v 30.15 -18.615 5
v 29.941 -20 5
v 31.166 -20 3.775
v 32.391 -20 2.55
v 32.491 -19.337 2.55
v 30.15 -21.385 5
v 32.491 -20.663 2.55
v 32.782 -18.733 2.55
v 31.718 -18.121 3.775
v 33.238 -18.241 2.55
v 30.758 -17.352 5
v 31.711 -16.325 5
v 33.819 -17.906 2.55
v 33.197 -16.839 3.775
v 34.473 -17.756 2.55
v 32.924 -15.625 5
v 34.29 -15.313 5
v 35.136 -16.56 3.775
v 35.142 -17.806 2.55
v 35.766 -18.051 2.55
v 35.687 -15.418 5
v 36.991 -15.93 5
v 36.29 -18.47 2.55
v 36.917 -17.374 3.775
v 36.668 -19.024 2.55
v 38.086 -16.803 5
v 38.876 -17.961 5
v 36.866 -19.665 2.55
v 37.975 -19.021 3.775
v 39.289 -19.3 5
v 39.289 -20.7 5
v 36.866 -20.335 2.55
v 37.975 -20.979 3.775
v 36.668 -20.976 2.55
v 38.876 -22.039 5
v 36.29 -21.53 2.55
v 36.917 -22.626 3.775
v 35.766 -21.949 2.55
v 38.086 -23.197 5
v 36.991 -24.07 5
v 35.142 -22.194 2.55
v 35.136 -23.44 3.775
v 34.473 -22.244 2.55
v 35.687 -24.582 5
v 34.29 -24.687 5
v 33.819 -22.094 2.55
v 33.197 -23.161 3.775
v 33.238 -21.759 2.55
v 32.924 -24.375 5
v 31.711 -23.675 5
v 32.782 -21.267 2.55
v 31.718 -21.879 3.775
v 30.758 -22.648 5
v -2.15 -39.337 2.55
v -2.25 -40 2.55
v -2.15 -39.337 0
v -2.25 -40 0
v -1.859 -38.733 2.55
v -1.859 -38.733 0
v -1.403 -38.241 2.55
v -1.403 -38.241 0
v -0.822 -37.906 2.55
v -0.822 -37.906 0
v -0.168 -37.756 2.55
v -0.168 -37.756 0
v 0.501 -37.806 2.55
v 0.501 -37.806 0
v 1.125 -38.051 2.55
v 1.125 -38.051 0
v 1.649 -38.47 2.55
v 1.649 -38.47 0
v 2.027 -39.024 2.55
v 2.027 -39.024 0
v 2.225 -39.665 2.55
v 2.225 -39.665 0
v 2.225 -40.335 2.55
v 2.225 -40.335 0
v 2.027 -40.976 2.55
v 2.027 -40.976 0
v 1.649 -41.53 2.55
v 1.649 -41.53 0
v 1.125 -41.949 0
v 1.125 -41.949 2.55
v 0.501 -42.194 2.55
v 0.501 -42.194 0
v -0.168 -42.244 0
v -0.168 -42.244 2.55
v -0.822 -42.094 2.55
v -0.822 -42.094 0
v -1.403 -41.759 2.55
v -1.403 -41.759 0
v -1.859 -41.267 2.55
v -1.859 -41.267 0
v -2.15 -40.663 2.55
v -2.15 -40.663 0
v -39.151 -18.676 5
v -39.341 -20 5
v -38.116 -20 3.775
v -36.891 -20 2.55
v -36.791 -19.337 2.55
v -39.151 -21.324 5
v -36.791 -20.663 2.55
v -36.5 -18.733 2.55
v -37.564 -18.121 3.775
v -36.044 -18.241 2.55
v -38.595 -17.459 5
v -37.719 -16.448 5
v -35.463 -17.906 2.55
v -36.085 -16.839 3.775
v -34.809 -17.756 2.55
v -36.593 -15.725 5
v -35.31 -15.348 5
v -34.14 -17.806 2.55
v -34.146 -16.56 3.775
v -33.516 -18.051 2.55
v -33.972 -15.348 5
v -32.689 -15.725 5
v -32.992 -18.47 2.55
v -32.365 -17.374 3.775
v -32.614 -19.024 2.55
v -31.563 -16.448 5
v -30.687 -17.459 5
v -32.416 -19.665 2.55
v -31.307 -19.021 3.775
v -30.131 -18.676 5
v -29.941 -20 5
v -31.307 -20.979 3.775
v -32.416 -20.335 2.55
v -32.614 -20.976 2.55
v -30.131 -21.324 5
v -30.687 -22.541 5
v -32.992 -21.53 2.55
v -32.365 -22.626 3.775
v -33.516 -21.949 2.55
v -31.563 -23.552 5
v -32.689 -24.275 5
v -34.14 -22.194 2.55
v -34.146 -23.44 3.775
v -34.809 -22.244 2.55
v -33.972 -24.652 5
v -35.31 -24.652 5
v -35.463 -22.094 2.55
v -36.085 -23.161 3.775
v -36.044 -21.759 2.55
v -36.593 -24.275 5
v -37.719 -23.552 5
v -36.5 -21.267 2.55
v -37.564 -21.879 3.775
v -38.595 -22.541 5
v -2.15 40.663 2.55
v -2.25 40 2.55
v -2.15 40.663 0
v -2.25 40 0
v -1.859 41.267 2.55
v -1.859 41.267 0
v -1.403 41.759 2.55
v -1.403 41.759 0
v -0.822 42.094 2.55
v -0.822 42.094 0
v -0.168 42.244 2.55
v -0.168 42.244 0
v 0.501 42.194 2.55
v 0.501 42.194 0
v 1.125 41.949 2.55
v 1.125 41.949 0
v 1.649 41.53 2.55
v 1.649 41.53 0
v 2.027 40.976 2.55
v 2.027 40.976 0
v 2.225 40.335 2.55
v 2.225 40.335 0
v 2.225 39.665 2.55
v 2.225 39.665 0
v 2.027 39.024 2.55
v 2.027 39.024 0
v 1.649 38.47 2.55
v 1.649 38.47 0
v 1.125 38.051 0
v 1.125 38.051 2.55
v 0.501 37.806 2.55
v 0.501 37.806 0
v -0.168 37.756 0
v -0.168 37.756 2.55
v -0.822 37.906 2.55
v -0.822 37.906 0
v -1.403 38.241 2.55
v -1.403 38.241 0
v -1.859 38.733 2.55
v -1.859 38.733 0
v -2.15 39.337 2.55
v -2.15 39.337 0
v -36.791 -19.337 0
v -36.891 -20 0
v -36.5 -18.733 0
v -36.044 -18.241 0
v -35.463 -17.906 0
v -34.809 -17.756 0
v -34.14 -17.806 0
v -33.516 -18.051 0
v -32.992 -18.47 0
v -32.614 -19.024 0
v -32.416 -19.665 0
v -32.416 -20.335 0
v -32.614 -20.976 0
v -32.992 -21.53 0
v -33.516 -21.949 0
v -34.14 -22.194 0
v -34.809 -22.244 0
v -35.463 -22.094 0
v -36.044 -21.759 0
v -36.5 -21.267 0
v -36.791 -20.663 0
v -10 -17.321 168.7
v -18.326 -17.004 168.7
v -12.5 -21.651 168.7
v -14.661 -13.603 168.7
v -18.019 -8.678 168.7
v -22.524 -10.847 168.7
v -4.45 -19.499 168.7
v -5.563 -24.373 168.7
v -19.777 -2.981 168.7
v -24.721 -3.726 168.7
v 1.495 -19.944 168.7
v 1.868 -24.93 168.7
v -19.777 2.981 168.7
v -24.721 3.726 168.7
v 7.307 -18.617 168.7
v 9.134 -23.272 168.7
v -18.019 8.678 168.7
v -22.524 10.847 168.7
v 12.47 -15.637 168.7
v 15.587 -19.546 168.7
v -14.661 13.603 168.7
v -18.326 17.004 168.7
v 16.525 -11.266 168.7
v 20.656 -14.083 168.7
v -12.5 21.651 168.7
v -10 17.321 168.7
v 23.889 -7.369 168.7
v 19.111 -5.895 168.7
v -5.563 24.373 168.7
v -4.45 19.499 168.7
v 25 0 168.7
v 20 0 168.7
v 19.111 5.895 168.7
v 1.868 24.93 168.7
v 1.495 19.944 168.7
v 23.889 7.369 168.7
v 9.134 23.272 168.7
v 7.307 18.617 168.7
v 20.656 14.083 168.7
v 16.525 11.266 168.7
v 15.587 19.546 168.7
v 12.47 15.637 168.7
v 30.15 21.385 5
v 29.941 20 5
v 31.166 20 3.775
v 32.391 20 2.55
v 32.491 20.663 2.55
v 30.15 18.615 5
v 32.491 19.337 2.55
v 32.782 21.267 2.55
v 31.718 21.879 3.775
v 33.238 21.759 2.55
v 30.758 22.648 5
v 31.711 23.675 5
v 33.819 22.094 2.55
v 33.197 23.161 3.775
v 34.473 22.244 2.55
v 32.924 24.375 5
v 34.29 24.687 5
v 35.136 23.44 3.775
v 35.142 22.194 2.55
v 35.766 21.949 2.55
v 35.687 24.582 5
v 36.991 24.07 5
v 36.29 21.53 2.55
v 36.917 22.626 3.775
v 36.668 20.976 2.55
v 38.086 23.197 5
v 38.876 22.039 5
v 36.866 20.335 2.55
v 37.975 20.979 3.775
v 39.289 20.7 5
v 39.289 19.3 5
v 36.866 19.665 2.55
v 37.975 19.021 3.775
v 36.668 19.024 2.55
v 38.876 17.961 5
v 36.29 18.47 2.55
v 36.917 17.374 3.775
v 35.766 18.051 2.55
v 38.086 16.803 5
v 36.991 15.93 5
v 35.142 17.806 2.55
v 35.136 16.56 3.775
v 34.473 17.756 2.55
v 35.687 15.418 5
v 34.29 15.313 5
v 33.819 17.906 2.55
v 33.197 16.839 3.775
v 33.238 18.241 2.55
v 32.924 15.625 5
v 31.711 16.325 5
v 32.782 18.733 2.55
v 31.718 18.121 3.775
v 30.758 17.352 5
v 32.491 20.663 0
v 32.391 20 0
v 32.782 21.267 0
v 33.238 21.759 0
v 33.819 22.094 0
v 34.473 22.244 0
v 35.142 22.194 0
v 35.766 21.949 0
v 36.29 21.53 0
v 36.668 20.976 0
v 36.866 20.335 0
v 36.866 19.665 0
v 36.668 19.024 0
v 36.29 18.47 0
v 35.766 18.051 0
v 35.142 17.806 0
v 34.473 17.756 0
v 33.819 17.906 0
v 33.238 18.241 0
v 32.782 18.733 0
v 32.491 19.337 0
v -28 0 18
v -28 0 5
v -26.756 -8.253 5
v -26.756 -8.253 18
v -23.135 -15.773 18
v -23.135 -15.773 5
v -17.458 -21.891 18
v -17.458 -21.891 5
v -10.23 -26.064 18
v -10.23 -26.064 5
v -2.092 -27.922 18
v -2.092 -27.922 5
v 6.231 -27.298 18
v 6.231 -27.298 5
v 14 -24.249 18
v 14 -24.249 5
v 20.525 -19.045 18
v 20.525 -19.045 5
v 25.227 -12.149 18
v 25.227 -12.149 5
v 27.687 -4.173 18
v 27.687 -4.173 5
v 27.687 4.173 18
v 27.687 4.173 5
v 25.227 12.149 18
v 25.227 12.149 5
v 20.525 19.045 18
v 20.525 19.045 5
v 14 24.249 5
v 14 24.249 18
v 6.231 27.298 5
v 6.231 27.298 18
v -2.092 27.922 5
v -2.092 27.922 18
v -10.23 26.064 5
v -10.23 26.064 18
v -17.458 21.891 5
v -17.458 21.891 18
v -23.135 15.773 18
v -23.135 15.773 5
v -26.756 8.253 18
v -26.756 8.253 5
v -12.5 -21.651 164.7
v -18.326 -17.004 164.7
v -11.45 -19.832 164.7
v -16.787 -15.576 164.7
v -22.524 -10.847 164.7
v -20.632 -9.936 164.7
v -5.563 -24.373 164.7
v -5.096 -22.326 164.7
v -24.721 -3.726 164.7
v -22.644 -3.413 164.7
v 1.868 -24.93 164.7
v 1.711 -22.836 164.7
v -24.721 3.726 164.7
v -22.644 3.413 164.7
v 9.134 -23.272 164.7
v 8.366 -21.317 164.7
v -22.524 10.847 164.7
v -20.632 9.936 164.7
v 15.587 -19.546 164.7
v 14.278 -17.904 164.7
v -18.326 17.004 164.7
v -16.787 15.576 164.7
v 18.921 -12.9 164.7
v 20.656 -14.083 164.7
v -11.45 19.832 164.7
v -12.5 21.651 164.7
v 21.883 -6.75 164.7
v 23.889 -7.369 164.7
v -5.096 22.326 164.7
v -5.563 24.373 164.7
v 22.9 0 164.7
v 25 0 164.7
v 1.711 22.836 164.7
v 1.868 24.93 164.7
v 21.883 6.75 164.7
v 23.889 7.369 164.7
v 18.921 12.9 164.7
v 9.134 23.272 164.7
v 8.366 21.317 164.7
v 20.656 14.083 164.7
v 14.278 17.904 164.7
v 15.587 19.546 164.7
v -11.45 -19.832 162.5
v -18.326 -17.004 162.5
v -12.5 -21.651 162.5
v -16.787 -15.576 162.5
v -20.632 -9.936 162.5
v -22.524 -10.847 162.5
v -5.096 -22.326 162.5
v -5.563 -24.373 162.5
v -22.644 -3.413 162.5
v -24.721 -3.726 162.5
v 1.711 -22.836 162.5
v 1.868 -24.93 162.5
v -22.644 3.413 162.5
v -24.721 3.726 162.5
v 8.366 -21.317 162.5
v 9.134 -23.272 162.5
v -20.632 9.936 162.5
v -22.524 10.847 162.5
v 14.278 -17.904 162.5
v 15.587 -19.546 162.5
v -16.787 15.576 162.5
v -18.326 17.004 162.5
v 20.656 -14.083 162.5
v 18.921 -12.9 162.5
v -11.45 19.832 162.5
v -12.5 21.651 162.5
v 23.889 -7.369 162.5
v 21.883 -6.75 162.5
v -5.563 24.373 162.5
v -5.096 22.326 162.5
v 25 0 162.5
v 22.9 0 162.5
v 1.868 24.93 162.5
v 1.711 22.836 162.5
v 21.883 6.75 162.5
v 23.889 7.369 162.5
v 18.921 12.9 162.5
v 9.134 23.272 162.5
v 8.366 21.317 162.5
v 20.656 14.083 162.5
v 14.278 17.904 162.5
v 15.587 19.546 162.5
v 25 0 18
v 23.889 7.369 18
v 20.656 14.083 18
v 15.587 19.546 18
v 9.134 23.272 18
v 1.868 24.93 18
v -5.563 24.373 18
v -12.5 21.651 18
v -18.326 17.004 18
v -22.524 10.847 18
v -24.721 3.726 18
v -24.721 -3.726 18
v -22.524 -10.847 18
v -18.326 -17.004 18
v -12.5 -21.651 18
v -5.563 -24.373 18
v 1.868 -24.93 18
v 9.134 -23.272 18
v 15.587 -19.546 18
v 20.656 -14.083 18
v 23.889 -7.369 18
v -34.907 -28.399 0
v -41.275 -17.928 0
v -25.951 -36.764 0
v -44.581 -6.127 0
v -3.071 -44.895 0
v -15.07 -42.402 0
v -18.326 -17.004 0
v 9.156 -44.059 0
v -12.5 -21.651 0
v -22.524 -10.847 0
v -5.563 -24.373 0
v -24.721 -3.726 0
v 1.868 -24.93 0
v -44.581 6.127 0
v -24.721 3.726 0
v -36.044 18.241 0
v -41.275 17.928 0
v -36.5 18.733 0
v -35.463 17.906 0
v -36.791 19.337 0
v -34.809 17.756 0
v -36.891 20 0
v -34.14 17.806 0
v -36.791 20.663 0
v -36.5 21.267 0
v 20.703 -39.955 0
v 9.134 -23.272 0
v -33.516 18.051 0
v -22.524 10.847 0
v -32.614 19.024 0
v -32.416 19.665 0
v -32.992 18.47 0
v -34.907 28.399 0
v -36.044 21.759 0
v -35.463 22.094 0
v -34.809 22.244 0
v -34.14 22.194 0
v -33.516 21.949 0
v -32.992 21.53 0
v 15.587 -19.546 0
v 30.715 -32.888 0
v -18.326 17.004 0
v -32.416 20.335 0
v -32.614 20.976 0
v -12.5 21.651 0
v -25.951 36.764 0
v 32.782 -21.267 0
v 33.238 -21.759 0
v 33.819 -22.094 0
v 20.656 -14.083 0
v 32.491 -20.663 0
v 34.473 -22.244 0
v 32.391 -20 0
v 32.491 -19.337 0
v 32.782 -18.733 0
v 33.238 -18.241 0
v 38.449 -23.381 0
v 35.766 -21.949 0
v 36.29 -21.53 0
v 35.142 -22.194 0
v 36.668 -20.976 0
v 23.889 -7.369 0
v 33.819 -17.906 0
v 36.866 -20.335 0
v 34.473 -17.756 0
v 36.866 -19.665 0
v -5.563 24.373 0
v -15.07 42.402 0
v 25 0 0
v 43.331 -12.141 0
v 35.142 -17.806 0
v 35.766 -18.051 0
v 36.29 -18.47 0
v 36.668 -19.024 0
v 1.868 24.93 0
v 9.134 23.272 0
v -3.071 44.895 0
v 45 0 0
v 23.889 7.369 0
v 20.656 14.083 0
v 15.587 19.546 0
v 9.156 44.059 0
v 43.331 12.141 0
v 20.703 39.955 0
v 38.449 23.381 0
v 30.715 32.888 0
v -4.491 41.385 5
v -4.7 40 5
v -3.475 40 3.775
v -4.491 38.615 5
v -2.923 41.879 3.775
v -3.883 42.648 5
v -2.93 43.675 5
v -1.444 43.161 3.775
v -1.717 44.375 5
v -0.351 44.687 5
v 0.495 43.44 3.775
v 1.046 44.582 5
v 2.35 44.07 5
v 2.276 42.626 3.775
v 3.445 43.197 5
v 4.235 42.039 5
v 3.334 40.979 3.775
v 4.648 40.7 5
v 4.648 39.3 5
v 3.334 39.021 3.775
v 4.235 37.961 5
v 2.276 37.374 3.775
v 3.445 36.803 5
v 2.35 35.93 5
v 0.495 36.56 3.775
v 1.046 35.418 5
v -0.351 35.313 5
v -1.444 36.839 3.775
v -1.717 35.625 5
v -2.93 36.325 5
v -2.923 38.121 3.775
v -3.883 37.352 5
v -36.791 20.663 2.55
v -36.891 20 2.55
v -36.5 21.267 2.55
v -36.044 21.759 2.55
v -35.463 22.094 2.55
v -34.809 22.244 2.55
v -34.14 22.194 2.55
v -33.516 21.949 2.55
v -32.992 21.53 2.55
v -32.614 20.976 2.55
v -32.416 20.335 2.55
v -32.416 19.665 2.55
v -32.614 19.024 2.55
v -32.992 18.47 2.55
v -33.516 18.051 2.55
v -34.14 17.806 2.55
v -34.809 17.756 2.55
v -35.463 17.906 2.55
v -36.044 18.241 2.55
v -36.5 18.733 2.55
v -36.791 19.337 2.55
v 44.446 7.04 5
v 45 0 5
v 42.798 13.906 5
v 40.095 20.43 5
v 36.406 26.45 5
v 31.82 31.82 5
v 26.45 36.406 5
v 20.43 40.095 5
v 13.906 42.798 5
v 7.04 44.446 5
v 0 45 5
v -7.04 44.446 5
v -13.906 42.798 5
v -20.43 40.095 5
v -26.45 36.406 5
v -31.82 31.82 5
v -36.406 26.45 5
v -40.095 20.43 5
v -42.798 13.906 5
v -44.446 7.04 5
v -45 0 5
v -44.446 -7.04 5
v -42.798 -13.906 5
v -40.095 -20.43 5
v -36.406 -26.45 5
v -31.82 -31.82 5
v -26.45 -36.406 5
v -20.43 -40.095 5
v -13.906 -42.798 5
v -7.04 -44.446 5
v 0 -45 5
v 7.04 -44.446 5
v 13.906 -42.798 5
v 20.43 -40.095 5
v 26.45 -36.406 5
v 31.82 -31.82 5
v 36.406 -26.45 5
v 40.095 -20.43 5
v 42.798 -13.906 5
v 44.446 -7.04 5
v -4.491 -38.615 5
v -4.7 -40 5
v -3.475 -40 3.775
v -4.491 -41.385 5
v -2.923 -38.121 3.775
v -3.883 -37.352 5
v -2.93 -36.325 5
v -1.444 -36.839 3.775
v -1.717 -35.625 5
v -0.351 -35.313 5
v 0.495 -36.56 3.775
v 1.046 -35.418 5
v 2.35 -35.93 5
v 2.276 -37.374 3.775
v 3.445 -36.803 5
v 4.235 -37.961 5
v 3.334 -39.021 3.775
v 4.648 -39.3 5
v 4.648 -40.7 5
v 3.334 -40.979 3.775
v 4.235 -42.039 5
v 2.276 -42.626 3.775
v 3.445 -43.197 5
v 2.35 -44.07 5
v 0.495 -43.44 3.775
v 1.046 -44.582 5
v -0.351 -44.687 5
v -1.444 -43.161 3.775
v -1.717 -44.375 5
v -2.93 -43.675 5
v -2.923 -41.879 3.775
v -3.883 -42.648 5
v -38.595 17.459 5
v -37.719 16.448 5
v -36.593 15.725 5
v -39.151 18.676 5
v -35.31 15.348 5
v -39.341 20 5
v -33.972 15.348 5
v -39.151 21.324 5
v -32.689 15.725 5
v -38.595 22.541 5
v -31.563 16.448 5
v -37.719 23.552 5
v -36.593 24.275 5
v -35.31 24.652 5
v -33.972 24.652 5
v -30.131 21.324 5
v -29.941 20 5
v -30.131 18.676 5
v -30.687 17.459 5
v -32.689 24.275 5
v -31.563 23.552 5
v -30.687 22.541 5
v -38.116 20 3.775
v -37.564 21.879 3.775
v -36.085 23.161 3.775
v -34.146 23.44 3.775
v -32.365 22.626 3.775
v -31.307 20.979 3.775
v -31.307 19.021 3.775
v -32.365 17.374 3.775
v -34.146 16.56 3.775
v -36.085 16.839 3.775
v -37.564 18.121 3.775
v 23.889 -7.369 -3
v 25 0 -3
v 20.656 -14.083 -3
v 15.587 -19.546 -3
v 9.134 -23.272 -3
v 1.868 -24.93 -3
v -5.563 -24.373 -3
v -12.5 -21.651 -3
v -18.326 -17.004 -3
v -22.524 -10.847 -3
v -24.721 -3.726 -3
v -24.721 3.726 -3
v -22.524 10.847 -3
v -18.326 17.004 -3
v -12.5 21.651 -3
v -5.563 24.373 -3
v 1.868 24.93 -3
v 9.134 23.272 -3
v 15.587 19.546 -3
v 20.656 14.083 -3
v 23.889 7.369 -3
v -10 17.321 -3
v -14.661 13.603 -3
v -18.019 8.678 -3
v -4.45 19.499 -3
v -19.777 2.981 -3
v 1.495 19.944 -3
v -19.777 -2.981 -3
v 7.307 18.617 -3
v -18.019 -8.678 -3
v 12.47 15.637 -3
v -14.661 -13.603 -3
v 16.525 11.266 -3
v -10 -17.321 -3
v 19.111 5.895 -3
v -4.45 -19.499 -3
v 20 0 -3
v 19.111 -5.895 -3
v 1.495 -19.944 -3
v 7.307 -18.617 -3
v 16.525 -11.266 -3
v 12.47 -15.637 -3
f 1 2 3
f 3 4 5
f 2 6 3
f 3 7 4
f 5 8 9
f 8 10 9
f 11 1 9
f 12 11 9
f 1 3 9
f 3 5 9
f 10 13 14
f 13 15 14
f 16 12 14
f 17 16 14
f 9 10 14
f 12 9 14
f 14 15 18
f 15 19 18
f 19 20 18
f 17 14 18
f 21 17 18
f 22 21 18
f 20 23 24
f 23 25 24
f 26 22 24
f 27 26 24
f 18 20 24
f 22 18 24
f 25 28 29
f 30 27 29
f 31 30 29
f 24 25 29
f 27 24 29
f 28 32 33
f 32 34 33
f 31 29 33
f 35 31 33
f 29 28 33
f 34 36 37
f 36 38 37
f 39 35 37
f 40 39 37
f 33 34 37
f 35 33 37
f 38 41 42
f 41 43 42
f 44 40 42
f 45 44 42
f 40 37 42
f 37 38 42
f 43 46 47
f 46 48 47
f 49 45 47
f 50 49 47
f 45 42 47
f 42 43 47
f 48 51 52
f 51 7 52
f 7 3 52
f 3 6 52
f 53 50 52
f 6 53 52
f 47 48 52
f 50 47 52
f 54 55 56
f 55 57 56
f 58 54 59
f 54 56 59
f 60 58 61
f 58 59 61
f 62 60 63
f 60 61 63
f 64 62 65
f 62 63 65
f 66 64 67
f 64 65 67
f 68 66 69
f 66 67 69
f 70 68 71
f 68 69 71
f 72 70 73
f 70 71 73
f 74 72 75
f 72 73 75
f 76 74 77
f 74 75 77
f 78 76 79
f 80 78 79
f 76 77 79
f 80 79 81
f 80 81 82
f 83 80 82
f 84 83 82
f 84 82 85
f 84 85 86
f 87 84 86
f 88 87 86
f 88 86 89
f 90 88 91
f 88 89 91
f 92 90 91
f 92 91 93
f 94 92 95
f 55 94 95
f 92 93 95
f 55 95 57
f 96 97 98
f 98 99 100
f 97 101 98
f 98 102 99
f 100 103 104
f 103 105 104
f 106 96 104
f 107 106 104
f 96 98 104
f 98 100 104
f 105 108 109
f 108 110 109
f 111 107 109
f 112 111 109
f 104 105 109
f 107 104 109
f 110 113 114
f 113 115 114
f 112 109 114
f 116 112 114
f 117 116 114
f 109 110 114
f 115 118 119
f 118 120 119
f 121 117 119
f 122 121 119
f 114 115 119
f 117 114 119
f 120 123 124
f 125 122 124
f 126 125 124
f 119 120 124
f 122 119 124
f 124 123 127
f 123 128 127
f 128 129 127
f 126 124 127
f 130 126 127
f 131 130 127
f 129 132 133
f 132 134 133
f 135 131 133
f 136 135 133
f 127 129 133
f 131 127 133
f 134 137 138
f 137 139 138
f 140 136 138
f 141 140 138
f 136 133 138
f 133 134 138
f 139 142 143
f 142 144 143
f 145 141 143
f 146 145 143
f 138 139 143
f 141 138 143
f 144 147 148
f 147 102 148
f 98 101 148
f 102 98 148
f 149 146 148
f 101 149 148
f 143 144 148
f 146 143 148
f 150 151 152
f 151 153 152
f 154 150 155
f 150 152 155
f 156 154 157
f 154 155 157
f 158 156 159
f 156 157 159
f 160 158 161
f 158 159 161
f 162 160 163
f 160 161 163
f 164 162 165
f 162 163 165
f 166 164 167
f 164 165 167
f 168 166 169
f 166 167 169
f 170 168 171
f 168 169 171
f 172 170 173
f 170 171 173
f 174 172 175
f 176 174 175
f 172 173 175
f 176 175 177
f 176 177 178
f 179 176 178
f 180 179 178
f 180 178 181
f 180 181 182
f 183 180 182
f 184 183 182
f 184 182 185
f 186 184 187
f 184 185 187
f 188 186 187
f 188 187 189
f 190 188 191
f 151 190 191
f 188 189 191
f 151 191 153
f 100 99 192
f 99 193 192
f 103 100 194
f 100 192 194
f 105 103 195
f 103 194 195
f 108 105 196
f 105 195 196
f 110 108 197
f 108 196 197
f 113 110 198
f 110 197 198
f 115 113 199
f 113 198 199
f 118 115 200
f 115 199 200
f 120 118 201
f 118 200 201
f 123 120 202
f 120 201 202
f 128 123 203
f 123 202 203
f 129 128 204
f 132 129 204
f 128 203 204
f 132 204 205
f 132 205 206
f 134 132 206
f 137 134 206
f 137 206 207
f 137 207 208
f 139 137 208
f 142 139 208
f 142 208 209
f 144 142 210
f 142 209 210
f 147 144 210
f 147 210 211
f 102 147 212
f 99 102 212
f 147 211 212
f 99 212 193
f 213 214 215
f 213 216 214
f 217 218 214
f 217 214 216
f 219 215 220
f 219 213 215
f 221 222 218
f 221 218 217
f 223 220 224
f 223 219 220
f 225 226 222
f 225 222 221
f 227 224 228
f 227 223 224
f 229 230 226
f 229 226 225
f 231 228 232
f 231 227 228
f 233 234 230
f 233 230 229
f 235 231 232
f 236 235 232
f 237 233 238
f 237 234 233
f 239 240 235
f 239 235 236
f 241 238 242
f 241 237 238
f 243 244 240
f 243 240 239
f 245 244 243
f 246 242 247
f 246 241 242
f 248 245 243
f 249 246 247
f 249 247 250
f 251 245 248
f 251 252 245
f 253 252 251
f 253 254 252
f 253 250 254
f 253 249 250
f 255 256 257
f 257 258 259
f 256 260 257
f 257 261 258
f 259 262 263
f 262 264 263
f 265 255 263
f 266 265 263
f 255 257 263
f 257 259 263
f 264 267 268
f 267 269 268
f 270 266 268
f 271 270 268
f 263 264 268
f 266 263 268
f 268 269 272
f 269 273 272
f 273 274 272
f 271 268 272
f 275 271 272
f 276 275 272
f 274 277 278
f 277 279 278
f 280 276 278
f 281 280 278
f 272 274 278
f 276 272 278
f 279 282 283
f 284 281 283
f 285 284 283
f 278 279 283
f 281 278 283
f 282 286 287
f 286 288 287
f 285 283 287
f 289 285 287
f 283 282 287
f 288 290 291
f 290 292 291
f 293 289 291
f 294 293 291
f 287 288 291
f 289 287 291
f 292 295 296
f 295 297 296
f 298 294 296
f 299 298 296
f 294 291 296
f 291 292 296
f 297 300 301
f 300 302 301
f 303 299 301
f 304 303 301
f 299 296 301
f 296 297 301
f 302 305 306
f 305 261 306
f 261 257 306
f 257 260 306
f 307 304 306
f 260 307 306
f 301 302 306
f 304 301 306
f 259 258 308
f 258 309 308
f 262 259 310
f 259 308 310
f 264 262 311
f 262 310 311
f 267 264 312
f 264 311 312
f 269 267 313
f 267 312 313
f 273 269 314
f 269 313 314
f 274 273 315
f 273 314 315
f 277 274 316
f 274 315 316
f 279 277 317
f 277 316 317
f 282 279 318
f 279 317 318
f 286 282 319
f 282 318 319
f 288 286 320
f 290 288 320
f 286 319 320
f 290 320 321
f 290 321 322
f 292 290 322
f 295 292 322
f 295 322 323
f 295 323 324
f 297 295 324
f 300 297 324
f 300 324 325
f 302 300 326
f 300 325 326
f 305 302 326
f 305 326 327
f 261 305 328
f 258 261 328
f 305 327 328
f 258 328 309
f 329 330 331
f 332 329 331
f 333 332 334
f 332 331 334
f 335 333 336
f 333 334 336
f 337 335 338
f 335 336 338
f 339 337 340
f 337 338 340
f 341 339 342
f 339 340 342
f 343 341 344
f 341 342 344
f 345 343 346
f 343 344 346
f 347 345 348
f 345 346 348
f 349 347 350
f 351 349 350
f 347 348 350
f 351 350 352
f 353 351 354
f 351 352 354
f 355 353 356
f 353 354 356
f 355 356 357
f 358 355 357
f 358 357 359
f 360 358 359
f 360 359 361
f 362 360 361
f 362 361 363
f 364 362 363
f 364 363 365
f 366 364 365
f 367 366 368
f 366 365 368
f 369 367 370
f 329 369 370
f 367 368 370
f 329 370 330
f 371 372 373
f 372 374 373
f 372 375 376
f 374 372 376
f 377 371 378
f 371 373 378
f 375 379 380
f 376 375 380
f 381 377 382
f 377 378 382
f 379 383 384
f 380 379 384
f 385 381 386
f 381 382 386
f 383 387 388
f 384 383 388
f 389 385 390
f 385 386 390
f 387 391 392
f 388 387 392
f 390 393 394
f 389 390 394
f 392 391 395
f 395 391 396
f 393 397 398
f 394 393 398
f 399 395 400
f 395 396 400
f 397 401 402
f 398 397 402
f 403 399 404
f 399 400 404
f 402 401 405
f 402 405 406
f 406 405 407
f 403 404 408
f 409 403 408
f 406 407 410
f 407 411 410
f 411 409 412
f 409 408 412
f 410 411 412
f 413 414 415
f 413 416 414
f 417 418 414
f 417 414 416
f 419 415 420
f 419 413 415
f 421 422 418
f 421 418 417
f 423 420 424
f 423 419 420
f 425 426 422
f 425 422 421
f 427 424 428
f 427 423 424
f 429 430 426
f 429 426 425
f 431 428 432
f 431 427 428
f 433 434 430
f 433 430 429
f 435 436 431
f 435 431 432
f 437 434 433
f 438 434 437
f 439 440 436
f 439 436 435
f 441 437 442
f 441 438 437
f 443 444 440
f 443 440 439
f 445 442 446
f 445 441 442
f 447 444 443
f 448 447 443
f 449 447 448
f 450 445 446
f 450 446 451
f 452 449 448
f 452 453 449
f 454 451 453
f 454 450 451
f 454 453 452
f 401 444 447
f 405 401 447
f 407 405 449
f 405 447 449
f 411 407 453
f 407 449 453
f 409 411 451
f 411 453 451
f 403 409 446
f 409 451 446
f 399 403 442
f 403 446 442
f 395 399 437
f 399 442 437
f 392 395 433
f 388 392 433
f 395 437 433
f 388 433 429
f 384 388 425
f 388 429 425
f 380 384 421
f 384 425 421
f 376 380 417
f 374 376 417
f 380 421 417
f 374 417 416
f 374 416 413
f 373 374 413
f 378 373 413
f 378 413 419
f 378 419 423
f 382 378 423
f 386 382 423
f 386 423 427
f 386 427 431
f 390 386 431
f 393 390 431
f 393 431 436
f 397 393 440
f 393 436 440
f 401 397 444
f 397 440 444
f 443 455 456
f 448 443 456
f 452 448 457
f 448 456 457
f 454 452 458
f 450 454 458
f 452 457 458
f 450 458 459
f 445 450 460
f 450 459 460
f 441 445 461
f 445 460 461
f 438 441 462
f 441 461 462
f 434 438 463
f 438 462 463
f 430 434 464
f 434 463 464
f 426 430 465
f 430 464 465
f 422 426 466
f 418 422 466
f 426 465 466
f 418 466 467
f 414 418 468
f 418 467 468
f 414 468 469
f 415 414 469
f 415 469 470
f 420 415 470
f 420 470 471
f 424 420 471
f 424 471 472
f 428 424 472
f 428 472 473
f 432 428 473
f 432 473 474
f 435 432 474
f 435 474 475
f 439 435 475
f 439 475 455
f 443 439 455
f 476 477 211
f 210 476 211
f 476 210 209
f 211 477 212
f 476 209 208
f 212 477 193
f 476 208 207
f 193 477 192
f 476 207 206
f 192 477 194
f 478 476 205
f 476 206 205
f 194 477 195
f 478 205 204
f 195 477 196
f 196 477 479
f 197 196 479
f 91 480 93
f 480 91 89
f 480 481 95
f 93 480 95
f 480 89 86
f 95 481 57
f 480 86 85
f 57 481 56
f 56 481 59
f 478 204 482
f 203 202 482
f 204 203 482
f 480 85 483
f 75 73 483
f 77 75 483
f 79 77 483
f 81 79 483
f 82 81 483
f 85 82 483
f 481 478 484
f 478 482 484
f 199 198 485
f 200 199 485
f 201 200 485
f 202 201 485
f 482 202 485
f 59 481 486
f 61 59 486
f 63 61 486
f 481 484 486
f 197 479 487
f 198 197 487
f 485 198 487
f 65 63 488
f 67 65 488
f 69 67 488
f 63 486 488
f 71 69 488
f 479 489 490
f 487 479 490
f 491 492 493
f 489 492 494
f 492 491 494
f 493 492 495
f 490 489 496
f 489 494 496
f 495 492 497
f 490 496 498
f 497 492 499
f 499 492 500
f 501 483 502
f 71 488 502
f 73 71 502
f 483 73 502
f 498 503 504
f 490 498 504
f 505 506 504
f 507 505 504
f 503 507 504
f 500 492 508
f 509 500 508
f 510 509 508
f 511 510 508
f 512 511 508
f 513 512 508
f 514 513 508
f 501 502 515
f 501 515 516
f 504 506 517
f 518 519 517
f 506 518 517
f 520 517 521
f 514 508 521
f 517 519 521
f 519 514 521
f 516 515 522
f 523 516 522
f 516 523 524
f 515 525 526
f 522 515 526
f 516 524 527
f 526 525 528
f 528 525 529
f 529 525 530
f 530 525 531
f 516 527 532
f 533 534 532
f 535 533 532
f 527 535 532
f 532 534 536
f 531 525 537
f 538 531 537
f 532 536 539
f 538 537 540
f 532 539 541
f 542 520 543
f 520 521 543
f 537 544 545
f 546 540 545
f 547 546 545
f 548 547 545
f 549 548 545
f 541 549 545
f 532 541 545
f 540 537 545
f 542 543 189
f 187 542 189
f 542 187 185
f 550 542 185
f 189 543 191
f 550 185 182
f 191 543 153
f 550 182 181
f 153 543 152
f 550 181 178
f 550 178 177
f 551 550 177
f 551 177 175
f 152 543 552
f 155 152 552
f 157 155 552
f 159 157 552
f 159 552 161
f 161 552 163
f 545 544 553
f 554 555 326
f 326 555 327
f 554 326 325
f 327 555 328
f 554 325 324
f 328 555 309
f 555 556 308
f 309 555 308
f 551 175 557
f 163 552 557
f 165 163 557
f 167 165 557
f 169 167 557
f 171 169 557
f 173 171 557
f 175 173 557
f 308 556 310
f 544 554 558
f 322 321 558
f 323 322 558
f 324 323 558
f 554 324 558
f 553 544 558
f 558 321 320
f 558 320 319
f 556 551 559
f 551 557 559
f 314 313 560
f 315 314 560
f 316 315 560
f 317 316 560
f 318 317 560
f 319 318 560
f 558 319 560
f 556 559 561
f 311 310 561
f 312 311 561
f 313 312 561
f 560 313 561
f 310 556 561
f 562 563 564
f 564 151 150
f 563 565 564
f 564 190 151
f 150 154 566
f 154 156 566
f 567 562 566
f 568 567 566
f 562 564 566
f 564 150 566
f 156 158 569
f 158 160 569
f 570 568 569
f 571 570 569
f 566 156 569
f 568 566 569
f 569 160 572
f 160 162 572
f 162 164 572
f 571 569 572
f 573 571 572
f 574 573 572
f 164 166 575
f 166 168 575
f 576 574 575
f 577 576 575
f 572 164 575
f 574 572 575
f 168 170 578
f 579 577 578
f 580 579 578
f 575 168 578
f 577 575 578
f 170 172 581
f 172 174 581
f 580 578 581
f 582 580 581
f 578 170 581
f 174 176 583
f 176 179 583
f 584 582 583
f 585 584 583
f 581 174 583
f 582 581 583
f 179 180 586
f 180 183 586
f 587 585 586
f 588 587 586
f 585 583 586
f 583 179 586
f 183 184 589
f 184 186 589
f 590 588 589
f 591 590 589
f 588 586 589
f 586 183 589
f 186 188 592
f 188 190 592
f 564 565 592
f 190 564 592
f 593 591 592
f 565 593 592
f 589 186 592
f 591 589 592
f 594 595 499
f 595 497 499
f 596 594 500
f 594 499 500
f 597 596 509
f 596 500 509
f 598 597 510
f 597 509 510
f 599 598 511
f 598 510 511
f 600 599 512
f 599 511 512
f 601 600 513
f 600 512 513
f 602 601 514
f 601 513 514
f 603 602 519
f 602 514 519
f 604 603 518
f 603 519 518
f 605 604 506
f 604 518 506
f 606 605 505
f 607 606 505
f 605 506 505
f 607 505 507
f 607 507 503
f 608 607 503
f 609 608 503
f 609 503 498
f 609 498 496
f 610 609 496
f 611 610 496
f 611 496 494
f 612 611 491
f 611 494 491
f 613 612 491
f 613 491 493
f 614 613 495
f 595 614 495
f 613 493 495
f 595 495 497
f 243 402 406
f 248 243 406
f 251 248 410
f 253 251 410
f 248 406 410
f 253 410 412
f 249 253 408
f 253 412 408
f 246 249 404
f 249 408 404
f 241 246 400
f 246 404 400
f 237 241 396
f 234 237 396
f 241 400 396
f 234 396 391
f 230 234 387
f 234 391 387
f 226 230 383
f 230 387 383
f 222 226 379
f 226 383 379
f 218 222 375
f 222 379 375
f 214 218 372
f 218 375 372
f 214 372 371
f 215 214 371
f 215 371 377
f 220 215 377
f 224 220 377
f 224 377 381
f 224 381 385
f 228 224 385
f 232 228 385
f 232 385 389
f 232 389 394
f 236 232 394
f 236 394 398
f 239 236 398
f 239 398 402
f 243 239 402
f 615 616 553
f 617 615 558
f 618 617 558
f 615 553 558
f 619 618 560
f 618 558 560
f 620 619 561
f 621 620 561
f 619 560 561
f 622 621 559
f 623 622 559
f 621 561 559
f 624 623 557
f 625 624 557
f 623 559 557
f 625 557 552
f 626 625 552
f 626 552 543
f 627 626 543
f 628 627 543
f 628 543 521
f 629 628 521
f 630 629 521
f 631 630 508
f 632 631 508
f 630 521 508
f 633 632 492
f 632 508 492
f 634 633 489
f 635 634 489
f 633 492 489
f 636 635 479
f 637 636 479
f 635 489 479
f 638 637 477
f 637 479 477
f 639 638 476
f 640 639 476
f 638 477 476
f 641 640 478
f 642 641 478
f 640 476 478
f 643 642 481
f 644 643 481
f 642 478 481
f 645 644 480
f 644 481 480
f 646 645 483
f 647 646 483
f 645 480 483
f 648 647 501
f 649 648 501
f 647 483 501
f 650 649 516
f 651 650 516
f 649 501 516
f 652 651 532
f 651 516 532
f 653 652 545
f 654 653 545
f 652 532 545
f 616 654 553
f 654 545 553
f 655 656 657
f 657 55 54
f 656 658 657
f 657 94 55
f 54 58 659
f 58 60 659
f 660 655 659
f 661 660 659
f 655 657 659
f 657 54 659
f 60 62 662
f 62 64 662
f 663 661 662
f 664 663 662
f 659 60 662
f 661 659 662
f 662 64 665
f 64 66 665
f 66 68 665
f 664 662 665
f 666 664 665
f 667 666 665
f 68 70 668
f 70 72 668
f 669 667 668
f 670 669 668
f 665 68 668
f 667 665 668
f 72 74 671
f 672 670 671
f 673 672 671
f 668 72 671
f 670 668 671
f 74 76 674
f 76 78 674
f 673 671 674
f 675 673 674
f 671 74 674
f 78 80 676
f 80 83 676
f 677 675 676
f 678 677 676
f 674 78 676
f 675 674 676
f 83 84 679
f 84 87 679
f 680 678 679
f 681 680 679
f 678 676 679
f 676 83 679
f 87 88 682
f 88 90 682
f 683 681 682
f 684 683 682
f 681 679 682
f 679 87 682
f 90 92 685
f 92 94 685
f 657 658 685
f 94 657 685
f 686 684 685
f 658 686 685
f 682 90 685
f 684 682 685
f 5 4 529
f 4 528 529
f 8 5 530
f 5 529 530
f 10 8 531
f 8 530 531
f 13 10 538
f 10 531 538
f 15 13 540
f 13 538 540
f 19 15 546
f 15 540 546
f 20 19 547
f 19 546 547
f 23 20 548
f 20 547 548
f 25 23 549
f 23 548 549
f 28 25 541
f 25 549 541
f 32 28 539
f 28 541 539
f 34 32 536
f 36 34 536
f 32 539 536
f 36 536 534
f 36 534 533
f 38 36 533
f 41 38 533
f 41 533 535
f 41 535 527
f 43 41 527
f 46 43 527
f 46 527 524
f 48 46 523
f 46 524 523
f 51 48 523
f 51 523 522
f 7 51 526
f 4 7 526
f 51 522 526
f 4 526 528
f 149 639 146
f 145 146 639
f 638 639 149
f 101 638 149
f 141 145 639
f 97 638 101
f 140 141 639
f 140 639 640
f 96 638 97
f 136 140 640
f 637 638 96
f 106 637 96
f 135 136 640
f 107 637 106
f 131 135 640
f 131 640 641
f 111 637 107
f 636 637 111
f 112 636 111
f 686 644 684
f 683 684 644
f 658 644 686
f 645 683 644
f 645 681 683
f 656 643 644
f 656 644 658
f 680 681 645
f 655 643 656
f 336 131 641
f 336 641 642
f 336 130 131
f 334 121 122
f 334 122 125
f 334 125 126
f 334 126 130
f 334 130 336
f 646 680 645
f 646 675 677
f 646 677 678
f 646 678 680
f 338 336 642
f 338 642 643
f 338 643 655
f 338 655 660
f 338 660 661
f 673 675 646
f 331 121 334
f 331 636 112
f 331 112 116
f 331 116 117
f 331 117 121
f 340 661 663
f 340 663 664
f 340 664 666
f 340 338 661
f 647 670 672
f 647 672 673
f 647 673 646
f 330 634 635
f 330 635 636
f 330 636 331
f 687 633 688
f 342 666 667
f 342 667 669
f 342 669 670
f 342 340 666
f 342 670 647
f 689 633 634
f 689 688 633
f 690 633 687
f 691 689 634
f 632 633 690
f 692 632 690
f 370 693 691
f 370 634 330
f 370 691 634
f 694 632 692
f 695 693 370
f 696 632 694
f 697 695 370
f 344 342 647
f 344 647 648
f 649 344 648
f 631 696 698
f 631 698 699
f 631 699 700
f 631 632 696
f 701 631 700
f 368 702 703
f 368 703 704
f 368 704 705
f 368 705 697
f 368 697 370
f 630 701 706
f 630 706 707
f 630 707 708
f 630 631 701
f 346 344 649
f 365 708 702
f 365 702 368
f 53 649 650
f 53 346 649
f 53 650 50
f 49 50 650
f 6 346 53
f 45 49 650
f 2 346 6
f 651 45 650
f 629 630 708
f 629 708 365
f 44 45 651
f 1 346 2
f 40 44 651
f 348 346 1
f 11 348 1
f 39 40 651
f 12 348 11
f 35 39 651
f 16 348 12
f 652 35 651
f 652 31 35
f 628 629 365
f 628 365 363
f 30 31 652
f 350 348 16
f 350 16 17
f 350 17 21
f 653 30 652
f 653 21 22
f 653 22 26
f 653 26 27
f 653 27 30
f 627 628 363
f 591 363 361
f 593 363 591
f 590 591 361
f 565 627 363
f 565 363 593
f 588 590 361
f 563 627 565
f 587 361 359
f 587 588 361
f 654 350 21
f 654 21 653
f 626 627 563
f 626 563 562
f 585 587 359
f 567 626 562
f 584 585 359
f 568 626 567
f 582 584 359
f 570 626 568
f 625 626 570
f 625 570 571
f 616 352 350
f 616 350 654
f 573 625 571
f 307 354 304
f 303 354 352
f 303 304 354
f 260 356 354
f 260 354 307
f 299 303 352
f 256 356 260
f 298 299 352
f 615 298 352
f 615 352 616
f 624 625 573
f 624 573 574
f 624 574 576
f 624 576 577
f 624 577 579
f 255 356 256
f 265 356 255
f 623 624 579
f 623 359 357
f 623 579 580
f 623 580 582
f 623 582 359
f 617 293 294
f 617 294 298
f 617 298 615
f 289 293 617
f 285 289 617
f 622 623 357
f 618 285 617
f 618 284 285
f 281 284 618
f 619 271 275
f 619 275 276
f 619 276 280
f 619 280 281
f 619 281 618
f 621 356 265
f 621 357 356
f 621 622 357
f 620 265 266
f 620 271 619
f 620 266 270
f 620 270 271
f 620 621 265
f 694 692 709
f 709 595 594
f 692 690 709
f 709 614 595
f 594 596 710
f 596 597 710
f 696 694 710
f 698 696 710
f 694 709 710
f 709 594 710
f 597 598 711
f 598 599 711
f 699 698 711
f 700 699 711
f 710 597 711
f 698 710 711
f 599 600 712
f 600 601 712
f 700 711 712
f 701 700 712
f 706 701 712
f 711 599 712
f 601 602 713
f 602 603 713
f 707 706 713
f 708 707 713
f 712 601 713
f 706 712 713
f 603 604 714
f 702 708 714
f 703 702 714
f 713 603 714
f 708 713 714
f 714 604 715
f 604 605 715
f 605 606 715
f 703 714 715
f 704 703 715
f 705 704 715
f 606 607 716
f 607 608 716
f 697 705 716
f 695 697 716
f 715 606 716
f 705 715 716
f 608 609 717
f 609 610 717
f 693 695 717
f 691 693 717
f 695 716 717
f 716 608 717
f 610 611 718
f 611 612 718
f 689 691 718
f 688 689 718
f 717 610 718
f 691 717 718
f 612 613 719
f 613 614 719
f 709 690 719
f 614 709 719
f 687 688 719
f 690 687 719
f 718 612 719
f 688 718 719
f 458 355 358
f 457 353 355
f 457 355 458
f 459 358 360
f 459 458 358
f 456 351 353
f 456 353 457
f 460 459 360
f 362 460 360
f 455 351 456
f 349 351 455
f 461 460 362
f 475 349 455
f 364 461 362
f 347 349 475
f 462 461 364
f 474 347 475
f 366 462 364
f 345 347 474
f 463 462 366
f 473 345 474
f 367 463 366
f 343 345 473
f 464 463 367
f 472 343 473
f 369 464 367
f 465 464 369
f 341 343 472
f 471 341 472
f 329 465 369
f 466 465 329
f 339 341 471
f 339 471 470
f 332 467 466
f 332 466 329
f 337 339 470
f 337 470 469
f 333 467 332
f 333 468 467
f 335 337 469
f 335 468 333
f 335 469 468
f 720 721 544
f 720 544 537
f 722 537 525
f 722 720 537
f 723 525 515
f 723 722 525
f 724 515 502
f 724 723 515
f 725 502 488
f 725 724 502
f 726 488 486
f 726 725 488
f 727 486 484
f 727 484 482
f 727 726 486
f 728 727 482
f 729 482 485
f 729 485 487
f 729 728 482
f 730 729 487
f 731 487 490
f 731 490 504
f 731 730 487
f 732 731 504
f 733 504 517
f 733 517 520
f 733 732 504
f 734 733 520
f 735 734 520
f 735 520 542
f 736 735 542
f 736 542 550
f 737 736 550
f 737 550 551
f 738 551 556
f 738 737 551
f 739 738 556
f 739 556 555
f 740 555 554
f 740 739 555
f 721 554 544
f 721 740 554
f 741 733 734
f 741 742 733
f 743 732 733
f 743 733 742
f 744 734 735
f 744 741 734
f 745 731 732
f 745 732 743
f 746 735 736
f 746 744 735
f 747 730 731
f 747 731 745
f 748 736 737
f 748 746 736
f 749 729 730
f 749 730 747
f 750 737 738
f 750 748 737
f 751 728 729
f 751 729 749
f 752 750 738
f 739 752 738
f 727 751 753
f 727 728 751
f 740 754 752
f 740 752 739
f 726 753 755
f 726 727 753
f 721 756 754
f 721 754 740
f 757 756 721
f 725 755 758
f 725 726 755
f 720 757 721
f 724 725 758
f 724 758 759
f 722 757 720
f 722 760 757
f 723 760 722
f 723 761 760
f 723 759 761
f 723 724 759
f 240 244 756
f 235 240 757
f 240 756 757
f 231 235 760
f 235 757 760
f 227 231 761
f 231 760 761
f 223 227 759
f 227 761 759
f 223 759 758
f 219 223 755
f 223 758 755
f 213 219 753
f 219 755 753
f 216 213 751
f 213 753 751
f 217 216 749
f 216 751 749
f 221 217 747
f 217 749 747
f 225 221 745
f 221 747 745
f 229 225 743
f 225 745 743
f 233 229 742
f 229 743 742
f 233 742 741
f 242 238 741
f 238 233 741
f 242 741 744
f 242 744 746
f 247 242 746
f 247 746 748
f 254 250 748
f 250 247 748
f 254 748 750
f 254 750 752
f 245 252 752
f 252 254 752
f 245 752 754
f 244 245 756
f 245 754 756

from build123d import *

# Parameters (mm, degrees)
SKETCH1_R                                       = 45
SKETCH1_R_2                                     = 2
EXTRUDE1_DEPTH                                  = 5
SKETCH2_R                                       = 28
EXTRUDE2_DEPTH                                  = 13
SKETCH3_R                                       = 25
EXTRUDE3_DEPTH                                  = 150.7
SKETCH4_R                                       = 20
CUT_EXTRUDE1_DEPTH                              = 200
CUT_EXTRUDE2_START                              = -6.2
SKETCH5_R                                       = 25
SKETCH5_R_2                                     = 22.9
CUT_EXTRUDE2_DEPTH                              = 2.2
BOSS_EXTRUDE1_START                             = 3
SKETCH6_R                                       = 25
SKETCH6_R_2                                     = 20
BOSS_EXTRUDE1_DEPTH                             = 3
CSK_FOR_M4_FLAT_HEAD_MACHINE_SCREW1_D           = 4.5
CSK_FOR_M4_FLAT_HEAD_MACHINE_SCREW1_CSINK_D     = 9.4
CSK_FOR_M4_FLAT_HEAD_MACHINE_SCREW1_CSINK_ANGLE = 90


with BuildPart() as part:
    # Sketch1 → Extrude1 (new body)
    with BuildSketch(Plane.XY):
        Circle(SKETCH1_R)
        with Locations((-34.641016151, -20)):
            Circle(SKETCH1_R_2, mode=Mode.SUBTRACT)
        with Locations((-34.641016151, 20)):
            Circle(SKETCH1_R_2, mode=Mode.SUBTRACT)
        with Locations((0, 40)):
            Circle(SKETCH1_R_2, mode=Mode.SUBTRACT)
        with Locations((0, -40)):
            Circle(SKETCH1_R_2, mode=Mode.SUBTRACT)
        with Locations((34.641016151, 20)):
            Circle(SKETCH1_R_2, mode=Mode.SUBTRACT)
        with Locations((34.641016151, -20)):
            Circle(SKETCH1_R_2, mode=Mode.SUBTRACT)
    extrude(amount=EXTRUDE1_DEPTH)

    # Sketch2 → Extrude2 (add)
    with BuildSketch(Plane.XY.offset(5)):
        with Locations(Location((0, 0, 0), (0, 0, 180))):
            Circle(SKETCH2_R)
    extrude(amount=EXTRUDE2_DEPTH)

    # Sketch3 → Extrude3 (add)
    with BuildSketch(Plane.XY.offset(18)):
        Circle(SKETCH3_R)
    extrude(amount=EXTRUDE3_DEPTH)

    # Sketch4 → Cut-Extrude1 (cut)
    with BuildSketch(Plane.XY.offset(168.7)):
        Circle(SKETCH4_R)
    extrude(amount=-CUT_EXTRUDE1_DEPTH, mode=Mode.SUBTRACT)

    # Sketch5 → Cut-Extrude2 (cut)
    with BuildSketch(Plane.XY.offset(168.7).offset(CUT_EXTRUDE2_START)):
        Circle(SKETCH5_R)
        Circle(SKETCH5_R_2, mode=Mode.SUBTRACT)
    extrude(amount=CUT_EXTRUDE2_DEPTH, mode=Mode.SUBTRACT)

    # Sketch6 → Boss-Extrude1 (add)
    with BuildSketch(Plane(origin=(0, 0, 0), x_dir=(-1, 0, 0), z_dir=(0, 0, -1)).offset(BOSS_EXTRUDE1_START)):
        with Locations(Location((0, 0, 0), (0, 0, 180))):
            Circle(SKETCH6_R)
        with Locations(Location((0, 0, 0), (0, 0, 180))):
            Circle(SKETCH6_R_2, mode=Mode.SUBTRACT)
    extrude(amount=-BOSS_EXTRUDE1_DEPTH)

    # CSK for M4 Flat Head Machine Screw1 (through all)
    with Locations(Plane.XY.offset(5)):
        with Locations((34.641016151, -20), (0, -40), (-34.641016151, -20), (-34.641016151, 20), (0, 40), (34.641016151, 20)):
            CounterSinkHole(CSK_FOR_M4_FLAT_HEAD_MACHINE_SCREW1_D / 2, CSK_FOR_M4_FLAT_HEAD_MACHINE_SCREW1_CSINK_D / 2, counter_sink_angle=CSK_FOR_M4_FLAT_HEAD_MACHINE_SCREW1_CSINK_ANGLE)


solid = part.part
